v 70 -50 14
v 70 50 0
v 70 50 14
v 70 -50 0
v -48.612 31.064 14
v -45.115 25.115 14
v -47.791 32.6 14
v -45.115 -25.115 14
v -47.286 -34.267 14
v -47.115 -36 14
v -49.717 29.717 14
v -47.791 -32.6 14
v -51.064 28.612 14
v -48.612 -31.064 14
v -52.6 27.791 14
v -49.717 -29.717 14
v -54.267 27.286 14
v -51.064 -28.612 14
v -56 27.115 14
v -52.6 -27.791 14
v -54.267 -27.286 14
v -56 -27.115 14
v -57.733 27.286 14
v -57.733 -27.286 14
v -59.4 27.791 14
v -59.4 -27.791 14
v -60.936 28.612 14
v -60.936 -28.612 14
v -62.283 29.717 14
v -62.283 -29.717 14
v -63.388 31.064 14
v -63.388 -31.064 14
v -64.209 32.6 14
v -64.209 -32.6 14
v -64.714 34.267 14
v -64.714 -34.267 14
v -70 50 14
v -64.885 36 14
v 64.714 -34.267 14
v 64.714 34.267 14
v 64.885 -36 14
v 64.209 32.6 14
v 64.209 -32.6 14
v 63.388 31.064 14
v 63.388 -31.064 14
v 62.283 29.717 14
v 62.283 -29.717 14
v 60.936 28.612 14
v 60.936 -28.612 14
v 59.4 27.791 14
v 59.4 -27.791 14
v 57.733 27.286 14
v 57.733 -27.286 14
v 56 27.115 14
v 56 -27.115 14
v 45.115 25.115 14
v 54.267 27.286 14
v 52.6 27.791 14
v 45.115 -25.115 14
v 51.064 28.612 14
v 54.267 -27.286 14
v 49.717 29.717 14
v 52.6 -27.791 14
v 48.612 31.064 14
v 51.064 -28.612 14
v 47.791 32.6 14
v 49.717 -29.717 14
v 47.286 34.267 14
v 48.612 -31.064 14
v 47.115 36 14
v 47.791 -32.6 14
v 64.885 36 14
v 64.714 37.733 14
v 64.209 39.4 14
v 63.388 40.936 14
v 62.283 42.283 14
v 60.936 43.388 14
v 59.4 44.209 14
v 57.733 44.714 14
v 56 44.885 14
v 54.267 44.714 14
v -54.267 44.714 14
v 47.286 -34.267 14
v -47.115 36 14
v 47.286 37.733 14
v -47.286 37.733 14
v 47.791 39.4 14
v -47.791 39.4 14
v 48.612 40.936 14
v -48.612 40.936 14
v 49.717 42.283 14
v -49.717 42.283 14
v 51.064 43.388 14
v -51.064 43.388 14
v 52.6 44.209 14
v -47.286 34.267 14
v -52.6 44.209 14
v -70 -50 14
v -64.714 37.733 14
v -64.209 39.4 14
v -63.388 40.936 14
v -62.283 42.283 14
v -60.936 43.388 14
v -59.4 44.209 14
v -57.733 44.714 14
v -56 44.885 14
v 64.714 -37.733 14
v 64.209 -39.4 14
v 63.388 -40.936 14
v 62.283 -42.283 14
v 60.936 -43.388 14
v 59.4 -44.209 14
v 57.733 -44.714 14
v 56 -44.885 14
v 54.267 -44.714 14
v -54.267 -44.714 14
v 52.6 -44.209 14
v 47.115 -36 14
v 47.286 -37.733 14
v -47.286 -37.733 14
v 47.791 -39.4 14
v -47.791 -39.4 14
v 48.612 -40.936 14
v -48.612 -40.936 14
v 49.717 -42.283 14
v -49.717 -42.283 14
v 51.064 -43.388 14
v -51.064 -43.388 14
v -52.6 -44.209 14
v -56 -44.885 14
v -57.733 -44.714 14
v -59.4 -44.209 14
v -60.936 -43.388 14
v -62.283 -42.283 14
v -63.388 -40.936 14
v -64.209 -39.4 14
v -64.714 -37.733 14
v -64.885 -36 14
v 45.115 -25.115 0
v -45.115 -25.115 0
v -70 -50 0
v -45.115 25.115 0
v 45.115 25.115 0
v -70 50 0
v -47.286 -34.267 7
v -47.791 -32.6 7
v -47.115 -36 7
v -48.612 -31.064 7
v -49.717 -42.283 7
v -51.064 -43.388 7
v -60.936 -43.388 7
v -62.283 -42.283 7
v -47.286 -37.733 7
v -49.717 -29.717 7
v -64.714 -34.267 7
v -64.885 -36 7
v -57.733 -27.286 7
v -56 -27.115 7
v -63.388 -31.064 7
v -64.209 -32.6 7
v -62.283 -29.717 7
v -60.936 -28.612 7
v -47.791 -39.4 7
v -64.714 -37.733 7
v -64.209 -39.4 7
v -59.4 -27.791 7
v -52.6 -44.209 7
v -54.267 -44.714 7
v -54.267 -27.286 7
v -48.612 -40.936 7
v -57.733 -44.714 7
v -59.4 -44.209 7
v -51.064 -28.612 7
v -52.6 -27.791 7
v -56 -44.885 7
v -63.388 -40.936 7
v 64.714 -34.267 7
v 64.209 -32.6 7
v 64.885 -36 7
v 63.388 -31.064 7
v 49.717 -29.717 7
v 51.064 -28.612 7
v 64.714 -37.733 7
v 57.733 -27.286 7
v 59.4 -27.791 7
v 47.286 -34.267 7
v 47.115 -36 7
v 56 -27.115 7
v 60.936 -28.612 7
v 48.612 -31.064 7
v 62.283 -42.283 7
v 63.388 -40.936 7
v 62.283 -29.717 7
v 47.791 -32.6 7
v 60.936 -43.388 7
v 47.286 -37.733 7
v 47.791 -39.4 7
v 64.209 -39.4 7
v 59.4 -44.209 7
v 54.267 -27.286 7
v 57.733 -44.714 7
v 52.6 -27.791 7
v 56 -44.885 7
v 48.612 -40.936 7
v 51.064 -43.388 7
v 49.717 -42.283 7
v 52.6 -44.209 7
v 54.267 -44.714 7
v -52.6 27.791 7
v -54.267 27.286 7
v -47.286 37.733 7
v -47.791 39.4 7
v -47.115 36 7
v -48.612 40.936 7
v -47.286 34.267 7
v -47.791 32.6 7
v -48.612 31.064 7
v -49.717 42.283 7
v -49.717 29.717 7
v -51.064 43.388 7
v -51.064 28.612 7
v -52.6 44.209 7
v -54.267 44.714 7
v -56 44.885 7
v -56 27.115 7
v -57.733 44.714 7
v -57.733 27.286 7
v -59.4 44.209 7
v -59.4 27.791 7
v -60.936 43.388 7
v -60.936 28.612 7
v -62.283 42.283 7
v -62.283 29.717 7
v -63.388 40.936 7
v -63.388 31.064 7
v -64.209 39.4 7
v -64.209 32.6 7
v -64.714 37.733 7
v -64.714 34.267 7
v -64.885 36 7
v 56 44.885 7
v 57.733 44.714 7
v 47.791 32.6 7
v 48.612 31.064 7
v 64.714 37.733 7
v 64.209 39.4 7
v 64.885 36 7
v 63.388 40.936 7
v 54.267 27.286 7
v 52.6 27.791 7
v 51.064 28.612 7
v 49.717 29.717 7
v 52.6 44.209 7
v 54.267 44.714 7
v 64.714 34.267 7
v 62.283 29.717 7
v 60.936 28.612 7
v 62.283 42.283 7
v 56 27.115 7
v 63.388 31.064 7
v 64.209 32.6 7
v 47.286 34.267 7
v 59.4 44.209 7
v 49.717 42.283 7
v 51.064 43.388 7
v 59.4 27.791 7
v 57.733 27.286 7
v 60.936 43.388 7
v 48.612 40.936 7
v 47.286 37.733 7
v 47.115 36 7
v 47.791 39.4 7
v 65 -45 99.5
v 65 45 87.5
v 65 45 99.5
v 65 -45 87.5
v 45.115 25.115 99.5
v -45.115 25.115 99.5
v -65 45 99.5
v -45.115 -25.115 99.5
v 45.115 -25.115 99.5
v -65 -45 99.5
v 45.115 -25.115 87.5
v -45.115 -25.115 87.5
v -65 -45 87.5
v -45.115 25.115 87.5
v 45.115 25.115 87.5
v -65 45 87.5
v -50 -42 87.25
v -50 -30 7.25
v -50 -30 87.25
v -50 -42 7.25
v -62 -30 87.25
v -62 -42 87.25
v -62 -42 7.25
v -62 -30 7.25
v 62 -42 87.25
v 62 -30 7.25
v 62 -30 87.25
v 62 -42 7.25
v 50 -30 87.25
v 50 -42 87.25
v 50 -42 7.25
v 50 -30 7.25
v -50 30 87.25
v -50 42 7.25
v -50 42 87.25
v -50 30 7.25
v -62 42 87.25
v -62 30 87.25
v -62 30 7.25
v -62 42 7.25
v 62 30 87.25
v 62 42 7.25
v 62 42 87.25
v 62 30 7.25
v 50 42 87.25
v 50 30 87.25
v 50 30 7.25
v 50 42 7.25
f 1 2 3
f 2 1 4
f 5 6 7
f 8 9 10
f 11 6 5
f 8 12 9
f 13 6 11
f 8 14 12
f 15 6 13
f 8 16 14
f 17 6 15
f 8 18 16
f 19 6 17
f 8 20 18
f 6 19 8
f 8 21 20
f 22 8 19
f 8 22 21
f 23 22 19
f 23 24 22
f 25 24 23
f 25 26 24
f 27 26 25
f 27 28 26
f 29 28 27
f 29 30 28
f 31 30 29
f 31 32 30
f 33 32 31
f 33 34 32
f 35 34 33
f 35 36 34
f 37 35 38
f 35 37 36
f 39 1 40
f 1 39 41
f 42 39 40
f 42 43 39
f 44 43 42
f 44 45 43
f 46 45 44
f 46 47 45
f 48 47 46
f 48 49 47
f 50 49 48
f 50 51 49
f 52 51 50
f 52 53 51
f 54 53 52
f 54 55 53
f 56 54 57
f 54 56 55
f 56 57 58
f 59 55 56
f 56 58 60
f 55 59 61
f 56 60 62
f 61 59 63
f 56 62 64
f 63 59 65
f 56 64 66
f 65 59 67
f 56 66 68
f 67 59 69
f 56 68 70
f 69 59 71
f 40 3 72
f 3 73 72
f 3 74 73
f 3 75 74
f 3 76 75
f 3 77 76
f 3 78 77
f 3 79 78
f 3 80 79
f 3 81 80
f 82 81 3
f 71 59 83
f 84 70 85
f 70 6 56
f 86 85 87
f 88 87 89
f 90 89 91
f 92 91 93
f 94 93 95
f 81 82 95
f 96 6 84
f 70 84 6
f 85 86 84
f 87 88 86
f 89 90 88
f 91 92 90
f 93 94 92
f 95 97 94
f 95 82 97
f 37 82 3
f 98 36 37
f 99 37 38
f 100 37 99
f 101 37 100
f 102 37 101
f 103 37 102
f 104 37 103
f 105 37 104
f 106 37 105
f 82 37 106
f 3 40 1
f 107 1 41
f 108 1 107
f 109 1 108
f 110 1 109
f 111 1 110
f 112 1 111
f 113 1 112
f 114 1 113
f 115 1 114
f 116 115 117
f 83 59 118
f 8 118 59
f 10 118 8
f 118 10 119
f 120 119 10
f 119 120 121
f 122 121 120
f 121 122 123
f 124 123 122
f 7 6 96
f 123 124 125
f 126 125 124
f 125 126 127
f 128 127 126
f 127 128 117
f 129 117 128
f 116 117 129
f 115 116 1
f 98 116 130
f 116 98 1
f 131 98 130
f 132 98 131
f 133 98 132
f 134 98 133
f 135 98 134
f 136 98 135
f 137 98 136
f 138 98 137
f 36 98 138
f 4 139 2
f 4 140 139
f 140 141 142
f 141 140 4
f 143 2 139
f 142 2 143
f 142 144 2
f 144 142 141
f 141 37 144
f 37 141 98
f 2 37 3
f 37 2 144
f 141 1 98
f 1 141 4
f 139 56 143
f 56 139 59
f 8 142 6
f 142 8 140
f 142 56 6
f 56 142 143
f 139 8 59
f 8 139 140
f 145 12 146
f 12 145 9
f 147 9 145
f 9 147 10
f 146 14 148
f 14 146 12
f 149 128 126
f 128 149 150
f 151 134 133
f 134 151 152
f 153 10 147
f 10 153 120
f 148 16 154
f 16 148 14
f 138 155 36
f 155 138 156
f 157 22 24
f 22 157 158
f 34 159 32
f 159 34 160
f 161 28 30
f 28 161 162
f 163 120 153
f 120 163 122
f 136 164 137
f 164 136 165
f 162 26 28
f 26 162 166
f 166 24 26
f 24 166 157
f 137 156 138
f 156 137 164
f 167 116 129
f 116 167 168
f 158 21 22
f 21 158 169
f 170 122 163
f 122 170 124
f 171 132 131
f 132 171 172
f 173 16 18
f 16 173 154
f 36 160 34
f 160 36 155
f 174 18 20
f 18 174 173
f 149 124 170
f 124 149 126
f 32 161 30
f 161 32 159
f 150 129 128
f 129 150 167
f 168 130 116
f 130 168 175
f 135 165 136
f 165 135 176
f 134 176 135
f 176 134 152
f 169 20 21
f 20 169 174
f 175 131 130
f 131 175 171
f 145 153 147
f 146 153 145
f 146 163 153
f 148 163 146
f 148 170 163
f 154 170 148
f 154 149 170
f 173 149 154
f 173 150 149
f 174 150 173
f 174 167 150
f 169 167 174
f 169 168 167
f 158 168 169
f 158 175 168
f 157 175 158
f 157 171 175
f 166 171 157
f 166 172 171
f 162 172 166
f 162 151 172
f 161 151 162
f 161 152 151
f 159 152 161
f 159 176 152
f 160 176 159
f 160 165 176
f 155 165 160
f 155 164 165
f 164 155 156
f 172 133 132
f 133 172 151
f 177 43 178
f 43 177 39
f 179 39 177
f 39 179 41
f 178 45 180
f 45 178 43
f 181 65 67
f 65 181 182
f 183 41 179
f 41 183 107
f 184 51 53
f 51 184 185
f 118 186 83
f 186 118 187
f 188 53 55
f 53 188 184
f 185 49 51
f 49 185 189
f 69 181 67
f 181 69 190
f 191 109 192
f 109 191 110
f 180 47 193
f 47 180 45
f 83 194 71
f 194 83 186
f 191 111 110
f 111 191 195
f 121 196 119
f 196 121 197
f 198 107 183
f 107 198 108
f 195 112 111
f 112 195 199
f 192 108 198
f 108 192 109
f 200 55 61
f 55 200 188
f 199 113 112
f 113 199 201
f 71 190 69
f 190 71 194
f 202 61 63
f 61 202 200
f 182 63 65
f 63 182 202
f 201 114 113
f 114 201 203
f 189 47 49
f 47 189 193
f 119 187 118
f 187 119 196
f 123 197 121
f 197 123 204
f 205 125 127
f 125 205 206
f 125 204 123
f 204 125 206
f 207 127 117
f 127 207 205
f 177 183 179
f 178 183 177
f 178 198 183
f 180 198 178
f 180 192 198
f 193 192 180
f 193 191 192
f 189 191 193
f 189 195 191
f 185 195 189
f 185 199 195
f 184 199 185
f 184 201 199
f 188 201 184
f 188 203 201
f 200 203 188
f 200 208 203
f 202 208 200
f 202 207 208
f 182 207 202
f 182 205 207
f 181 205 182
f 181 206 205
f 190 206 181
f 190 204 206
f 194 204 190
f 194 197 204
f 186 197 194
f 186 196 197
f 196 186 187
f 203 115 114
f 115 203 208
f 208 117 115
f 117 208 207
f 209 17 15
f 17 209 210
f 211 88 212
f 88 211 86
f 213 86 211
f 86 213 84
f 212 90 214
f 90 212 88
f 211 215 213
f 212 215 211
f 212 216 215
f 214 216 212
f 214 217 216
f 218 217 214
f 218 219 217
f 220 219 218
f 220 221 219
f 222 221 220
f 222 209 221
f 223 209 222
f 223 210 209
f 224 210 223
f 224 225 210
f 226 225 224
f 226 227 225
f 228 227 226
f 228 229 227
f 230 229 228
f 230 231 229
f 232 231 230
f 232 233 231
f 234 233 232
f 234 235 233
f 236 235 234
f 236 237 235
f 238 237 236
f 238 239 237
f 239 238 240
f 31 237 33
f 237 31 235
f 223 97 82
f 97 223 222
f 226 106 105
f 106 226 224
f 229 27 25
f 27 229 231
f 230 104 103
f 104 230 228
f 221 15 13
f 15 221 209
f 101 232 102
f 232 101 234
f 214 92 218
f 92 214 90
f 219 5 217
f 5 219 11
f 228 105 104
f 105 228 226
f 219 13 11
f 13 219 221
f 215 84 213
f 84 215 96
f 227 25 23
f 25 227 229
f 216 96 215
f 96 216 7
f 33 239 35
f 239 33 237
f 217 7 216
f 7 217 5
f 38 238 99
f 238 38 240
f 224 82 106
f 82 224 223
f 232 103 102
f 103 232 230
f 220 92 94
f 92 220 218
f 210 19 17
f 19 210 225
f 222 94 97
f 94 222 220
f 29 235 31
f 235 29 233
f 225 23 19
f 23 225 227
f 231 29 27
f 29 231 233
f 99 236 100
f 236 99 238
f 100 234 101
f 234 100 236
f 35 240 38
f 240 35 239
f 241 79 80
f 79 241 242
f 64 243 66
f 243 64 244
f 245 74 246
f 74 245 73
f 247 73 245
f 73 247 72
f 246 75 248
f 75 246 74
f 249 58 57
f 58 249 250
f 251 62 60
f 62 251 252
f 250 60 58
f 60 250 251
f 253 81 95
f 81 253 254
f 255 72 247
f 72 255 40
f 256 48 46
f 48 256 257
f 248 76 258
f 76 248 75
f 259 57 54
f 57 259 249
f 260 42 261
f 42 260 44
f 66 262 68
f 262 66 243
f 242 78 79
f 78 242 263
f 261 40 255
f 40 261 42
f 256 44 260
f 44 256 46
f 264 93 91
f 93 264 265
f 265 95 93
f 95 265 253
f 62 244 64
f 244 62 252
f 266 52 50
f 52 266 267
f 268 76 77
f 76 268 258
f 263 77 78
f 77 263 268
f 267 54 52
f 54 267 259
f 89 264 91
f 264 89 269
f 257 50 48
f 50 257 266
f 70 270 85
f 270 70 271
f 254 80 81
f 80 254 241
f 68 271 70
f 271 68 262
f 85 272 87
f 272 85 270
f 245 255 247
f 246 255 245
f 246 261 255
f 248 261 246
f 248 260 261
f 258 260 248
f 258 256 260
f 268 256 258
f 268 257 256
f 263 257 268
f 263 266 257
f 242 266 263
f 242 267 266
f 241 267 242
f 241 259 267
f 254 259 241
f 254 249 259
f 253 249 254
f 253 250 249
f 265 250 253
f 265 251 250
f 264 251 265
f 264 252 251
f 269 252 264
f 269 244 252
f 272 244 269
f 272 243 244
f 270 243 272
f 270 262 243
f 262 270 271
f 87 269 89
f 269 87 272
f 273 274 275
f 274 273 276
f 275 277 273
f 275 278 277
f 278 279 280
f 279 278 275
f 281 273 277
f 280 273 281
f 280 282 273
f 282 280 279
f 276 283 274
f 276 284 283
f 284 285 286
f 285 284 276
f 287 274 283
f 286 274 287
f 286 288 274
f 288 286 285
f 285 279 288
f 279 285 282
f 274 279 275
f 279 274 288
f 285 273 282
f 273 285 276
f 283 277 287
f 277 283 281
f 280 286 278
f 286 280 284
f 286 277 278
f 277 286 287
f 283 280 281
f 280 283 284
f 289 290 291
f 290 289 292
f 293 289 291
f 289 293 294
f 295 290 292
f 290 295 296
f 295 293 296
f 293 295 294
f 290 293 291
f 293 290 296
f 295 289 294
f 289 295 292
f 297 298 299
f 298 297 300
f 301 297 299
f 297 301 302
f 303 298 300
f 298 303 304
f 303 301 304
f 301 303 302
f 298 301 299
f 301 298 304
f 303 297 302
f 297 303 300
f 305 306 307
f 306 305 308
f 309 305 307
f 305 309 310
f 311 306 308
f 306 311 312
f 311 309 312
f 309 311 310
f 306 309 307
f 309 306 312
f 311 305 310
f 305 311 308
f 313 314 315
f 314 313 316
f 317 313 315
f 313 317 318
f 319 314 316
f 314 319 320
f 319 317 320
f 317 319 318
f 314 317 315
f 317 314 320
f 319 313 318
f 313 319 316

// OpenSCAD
$fn = 32;

// ------------------------------------------------------------------------
// Frame cube: base 140 x 100 mm, posts 80 mm tall
// Every part is its own module, assembly() places every instance.
// ------------------------------------------------------------------------

// --- part 1 ---
module base_frame() {
  difference() {
    translate([-70, -50, 0]) cube([140, 100, 14]);
    translate([-45.115, -25.115, -1]) cube([90.23, 50.23, 16]);
    translate([-56, -36, 7]) cylinder(h = 8, d = 17.77);
    translate([56, -36, 7]) cylinder(h = 8, d = 17.77);
    translate([-56, 36, 7]) cylinder(h = 8, d = 17.77);
    translate([56, 36, 7]) cylinder(h = 8, d = 17.77);
  }
}

// --- part 2 ---
module corner_post() {
  translate([-6, -6, 0]) cube([12, 12, 80]);
}

// --- part 3 ---
module top_frame() {
  difference() {
    translate([-65, -45, 0]) cube([130, 90, 12]);
    translate([-45.115, -25.115, -1]) cube([90.23, 50.23, 14]);
  }
}

// --- assembly ---
module assembly() {
  color([0.80, 0.24, 0.20]) translate([0, 0, 0]) rotate([0, 0, 0]) base_frame();
  color([0.20, 0.45, 0.75]) translate([-56, -36, 7.25]) rotate([0, 0, 0]) corner_post();
  color([0.25, 0.62, 0.32]) translate([56, -36, 7.25]) rotate([0, 0, 0]) corner_post();
  color([0.92, 0.70, 0.18]) translate([-56, 36, 7.25]) rotate([0, 0, 0]) corner_post();
  color([0.58, 0.35, 0.70]) translate([56, 36, 7.25]) rotate([0, 0, 0]) corner_post();
  color([0.16, 0.66, 0.66]) translate([0, 0, 87.5]) rotate([0, 0, 0]) top_frame();
}

assembly();
